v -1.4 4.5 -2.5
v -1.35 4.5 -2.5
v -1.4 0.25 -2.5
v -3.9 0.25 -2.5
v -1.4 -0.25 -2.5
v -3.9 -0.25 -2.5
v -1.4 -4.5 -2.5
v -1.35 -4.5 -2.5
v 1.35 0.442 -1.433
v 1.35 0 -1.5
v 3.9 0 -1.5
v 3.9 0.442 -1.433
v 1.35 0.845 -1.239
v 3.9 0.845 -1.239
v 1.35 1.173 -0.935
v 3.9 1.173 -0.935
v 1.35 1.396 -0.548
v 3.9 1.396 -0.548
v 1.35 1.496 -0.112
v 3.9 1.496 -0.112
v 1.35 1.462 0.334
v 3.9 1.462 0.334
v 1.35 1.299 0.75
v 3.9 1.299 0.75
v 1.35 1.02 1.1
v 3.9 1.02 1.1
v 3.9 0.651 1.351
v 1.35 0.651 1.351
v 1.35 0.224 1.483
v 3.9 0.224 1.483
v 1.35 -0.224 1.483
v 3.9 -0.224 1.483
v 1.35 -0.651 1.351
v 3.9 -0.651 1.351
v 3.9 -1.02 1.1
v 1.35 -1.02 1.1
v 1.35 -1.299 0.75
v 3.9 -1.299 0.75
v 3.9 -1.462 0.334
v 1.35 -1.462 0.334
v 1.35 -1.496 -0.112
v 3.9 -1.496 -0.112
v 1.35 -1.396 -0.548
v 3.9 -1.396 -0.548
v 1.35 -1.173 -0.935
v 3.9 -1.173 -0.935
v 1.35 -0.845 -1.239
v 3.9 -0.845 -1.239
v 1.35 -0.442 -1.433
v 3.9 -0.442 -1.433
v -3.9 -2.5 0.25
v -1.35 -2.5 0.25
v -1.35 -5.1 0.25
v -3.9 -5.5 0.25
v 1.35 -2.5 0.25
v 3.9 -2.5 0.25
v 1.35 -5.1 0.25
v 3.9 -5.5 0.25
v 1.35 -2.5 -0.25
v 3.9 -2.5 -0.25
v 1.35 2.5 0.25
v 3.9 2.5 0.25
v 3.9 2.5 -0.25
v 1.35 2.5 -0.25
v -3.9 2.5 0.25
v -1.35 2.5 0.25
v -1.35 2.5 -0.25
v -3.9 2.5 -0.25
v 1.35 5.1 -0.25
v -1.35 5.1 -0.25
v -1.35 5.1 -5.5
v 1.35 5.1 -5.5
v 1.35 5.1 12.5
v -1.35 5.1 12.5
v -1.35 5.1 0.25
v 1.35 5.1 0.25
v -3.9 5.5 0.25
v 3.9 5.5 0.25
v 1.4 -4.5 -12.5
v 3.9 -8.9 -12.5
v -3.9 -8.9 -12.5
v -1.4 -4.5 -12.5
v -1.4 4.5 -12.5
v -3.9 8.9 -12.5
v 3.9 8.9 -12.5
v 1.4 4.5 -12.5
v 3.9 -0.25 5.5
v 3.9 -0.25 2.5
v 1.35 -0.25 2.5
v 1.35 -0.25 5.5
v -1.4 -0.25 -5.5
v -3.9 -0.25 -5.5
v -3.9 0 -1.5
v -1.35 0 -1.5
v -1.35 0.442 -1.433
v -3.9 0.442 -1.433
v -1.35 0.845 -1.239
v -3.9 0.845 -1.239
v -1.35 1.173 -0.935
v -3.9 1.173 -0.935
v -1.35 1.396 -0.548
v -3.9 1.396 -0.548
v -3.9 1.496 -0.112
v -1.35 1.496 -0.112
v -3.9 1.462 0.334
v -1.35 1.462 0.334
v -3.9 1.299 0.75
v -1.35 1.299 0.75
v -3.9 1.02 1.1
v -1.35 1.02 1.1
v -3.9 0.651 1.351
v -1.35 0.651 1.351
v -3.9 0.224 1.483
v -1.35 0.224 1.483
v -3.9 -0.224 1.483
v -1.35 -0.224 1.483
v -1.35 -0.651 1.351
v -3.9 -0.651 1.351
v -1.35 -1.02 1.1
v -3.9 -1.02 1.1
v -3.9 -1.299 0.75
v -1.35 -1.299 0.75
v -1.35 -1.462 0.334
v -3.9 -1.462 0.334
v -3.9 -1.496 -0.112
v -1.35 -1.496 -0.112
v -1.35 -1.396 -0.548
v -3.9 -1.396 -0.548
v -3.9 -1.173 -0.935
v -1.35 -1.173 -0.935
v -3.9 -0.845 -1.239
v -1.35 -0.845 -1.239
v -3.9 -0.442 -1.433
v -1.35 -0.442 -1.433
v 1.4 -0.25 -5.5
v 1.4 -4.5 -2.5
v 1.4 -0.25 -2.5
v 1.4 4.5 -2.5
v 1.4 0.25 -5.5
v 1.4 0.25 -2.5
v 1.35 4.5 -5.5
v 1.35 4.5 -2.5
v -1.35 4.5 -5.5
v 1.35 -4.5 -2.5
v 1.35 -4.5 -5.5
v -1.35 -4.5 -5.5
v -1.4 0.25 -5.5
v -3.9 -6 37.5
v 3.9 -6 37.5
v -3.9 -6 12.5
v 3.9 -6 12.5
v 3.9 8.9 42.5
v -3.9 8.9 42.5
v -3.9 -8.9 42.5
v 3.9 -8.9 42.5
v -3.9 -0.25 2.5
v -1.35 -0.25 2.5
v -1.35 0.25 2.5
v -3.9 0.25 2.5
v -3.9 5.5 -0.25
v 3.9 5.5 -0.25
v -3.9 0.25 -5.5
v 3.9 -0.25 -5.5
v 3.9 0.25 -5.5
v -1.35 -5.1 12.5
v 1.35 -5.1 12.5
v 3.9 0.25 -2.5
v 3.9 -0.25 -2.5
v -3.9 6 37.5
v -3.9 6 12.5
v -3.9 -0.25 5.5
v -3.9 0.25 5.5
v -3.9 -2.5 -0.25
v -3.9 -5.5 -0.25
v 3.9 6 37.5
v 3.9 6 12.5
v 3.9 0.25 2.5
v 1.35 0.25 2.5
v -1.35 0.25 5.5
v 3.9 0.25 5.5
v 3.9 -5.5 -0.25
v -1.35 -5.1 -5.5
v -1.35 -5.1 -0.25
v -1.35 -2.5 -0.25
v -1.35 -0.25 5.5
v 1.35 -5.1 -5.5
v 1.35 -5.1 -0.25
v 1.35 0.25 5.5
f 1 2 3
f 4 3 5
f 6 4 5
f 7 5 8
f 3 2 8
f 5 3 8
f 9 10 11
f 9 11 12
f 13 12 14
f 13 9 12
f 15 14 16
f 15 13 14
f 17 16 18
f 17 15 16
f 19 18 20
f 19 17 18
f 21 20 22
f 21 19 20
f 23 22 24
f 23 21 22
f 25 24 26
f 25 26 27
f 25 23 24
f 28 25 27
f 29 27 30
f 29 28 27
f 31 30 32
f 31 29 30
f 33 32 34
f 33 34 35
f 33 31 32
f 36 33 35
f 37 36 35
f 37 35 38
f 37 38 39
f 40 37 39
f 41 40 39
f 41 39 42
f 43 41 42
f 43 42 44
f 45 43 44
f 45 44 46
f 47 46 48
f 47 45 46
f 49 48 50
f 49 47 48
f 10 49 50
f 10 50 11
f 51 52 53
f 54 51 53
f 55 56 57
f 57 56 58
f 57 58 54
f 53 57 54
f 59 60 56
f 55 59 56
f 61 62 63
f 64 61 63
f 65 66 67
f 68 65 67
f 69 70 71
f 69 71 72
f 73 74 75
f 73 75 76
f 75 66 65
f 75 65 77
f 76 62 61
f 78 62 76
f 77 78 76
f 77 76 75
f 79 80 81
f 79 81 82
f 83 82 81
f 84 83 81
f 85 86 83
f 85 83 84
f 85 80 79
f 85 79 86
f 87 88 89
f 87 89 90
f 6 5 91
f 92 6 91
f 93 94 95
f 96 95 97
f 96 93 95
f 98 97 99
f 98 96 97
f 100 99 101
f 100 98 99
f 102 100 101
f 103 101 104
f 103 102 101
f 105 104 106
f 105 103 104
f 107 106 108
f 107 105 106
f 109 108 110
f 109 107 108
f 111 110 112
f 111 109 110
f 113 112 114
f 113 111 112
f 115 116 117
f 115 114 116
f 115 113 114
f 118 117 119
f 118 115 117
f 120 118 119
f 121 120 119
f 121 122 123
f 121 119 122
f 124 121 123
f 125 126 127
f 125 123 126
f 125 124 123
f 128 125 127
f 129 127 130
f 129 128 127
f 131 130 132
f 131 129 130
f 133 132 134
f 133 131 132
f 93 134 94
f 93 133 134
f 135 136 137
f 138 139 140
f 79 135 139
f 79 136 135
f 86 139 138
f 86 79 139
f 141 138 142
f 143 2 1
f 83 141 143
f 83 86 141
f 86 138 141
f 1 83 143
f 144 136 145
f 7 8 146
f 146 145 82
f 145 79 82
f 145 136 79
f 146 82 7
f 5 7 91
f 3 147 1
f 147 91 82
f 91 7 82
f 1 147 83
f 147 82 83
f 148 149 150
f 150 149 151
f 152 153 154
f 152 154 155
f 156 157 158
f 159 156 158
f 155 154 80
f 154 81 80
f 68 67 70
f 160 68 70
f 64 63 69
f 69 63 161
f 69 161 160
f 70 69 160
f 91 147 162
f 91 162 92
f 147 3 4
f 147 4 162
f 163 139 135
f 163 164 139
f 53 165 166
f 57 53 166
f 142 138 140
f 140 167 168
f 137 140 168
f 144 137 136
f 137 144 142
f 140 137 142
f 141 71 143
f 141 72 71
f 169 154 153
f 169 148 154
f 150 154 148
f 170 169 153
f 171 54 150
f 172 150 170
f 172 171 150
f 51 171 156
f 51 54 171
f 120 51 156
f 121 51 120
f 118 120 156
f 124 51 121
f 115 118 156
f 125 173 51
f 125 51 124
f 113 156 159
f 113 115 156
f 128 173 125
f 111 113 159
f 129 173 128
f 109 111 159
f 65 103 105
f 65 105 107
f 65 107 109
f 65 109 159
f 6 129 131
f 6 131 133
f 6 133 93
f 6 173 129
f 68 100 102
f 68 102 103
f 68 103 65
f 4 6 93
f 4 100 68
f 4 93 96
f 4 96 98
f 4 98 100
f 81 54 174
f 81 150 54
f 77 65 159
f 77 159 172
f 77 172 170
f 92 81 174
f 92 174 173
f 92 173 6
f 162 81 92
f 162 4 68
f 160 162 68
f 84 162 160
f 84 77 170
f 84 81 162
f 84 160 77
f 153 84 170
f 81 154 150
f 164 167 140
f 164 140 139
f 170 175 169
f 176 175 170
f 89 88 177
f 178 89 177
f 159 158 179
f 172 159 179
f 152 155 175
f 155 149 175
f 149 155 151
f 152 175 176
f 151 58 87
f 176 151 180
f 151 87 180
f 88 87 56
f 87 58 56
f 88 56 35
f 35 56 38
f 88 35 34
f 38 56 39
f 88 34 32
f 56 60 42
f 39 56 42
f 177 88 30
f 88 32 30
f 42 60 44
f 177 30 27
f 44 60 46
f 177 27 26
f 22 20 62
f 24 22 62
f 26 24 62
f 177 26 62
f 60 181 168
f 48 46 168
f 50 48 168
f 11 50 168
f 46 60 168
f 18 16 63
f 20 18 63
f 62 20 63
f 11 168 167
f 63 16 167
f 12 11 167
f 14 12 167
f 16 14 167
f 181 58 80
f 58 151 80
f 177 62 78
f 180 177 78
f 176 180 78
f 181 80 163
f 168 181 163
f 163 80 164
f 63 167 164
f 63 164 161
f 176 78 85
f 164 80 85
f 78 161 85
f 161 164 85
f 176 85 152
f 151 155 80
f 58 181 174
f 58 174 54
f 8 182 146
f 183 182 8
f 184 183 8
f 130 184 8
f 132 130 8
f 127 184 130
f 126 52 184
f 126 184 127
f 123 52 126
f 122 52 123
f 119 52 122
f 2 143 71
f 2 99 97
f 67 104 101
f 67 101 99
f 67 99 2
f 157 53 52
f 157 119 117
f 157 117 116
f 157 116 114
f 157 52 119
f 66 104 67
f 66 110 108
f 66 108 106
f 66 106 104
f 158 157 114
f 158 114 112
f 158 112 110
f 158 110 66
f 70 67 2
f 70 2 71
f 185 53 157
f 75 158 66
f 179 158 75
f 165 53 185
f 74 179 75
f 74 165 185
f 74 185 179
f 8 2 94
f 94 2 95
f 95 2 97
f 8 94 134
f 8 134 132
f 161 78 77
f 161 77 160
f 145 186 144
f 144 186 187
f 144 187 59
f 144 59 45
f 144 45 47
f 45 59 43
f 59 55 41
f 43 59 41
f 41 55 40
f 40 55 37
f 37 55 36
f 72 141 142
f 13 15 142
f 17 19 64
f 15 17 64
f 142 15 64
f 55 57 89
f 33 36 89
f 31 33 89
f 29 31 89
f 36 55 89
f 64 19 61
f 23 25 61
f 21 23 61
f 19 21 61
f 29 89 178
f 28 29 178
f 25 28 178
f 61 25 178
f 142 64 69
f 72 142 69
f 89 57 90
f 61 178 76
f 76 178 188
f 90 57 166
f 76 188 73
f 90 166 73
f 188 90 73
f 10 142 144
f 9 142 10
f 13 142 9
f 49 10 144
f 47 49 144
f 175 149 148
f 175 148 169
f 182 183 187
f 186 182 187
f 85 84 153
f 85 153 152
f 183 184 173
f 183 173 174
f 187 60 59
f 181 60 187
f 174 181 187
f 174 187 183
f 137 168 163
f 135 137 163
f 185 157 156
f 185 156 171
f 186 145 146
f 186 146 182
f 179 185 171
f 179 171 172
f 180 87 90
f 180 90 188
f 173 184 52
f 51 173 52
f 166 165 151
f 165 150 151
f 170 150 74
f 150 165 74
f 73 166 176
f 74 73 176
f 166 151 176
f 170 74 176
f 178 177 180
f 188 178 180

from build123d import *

# Parameters (mm, degrees)
SKETCH1_W           = 17.8
SKETCH1_H           = 25
SKETCH1_R           = 1.5
BOSS_EXTRUDE1_DEPTH = 3.9
SKETCH3_W           = 0.5
SKETCH3_H           = 3
CUT_EXTRUDE1_DEPTH  = 10
CIRPATTERN1_COUNT   = 4
SKETCH4_W           = 2.7
SKETCH4_H           = 10.2
CUT_EXTRUDE2_DEPTH  = 18
SKETCH5_W           = 2.8
SKETCH5_H           = 9
CUT_EXTRUDE3_DEPTH  = 10
SKETCH6_W           = 7.8
SKETCH6_H           = 17.8
BOSS_EXTRUDE2_DEPTH = 30
SKETCH7_W           = 25
SKETCH7_H           = 12
CUT_EXTRUDE4_DEPTH  = 30


with BuildPart() as part:
    # Sketch1 → Boss-Extrude1 (new, symmetric)
    with BuildSketch(Plane.YZ):
        Rectangle(SKETCH1_W, SKETCH1_H)
        with Locations(Location((0, 0, 0), (0, 0, 270))):
            Circle(SKETCH1_R, mode=Mode.SUBTRACT)
    extrude(amount=BOSS_EXTRUDE1_DEPTH, both=True)

    # Sketch3 → Cut-Extrude1 (cut)
    with BuildSketch(Plane(origin=(3.9, 0, 0), x_dir=(0, 0, -1), z_dir=(1, 0, 0))):
        with Locations((0, 4)):
            Rectangle(SKETCH3_W, SKETCH3_H)
    cut_extrude1 = extrude(amount=-CUT_EXTRUDE1_DEPTH, mode=Mode.SUBTRACT)

    # CirPattern1: Cut-Extrude1 ×4 about axis
    cirpattern1_axis = Axis((0, 0, 0), (1, 0, 0))
    for i in range(1, CIRPATTERN1_COUNT):
        add(cut_extrude1.rotate(cirpattern1_axis, i * 360 / CIRPATTERN1_COUNT), mode=Mode.SUBTRACT)

    # Sketch4 → Cut-Extrude2 (cut)
    with BuildSketch(Plane.XY.offset(12.5)):
        Rectangle(SKETCH4_W, SKETCH4_H)
    extrude(amount=-CUT_EXTRUDE2_DEPTH, mode=Mode.SUBTRACT)

    # Sketch5 → Cut-Extrude3 (cut)
    with BuildSketch(Plane(origin=(0, 0, -12.5), x_dir=(-1, 0, 0), z_dir=(0, 0, -1))):
        Rectangle(SKETCH5_W, SKETCH5_H)
    extrude(amount=-CUT_EXTRUDE3_DEPTH, mode=Mode.SUBTRACT)

    # Sketch6 → Boss-Extrude2 (add)
    with BuildSketch(Plane.XY.offset(12.5)):
        Rectangle(SKETCH6_W, SKETCH6_H)
    extrude(amount=BOSS_EXTRUDE2_DEPTH)

    # Sketch7 → Cut-Extrude4 (cut)
    with BuildSketch(Plane(origin=(3.9, 0, 0), x_dir=(0, 0, -1), z_dir=(1, 0, 0))):
        with Locations((-25, 0)):
            Rectangle(SKETCH7_W, SKETCH7_H)
    extrude(amount=-CUT_EXTRUDE4_DEPTH, mode=Mode.SUBTRACT)


solid = part.part
